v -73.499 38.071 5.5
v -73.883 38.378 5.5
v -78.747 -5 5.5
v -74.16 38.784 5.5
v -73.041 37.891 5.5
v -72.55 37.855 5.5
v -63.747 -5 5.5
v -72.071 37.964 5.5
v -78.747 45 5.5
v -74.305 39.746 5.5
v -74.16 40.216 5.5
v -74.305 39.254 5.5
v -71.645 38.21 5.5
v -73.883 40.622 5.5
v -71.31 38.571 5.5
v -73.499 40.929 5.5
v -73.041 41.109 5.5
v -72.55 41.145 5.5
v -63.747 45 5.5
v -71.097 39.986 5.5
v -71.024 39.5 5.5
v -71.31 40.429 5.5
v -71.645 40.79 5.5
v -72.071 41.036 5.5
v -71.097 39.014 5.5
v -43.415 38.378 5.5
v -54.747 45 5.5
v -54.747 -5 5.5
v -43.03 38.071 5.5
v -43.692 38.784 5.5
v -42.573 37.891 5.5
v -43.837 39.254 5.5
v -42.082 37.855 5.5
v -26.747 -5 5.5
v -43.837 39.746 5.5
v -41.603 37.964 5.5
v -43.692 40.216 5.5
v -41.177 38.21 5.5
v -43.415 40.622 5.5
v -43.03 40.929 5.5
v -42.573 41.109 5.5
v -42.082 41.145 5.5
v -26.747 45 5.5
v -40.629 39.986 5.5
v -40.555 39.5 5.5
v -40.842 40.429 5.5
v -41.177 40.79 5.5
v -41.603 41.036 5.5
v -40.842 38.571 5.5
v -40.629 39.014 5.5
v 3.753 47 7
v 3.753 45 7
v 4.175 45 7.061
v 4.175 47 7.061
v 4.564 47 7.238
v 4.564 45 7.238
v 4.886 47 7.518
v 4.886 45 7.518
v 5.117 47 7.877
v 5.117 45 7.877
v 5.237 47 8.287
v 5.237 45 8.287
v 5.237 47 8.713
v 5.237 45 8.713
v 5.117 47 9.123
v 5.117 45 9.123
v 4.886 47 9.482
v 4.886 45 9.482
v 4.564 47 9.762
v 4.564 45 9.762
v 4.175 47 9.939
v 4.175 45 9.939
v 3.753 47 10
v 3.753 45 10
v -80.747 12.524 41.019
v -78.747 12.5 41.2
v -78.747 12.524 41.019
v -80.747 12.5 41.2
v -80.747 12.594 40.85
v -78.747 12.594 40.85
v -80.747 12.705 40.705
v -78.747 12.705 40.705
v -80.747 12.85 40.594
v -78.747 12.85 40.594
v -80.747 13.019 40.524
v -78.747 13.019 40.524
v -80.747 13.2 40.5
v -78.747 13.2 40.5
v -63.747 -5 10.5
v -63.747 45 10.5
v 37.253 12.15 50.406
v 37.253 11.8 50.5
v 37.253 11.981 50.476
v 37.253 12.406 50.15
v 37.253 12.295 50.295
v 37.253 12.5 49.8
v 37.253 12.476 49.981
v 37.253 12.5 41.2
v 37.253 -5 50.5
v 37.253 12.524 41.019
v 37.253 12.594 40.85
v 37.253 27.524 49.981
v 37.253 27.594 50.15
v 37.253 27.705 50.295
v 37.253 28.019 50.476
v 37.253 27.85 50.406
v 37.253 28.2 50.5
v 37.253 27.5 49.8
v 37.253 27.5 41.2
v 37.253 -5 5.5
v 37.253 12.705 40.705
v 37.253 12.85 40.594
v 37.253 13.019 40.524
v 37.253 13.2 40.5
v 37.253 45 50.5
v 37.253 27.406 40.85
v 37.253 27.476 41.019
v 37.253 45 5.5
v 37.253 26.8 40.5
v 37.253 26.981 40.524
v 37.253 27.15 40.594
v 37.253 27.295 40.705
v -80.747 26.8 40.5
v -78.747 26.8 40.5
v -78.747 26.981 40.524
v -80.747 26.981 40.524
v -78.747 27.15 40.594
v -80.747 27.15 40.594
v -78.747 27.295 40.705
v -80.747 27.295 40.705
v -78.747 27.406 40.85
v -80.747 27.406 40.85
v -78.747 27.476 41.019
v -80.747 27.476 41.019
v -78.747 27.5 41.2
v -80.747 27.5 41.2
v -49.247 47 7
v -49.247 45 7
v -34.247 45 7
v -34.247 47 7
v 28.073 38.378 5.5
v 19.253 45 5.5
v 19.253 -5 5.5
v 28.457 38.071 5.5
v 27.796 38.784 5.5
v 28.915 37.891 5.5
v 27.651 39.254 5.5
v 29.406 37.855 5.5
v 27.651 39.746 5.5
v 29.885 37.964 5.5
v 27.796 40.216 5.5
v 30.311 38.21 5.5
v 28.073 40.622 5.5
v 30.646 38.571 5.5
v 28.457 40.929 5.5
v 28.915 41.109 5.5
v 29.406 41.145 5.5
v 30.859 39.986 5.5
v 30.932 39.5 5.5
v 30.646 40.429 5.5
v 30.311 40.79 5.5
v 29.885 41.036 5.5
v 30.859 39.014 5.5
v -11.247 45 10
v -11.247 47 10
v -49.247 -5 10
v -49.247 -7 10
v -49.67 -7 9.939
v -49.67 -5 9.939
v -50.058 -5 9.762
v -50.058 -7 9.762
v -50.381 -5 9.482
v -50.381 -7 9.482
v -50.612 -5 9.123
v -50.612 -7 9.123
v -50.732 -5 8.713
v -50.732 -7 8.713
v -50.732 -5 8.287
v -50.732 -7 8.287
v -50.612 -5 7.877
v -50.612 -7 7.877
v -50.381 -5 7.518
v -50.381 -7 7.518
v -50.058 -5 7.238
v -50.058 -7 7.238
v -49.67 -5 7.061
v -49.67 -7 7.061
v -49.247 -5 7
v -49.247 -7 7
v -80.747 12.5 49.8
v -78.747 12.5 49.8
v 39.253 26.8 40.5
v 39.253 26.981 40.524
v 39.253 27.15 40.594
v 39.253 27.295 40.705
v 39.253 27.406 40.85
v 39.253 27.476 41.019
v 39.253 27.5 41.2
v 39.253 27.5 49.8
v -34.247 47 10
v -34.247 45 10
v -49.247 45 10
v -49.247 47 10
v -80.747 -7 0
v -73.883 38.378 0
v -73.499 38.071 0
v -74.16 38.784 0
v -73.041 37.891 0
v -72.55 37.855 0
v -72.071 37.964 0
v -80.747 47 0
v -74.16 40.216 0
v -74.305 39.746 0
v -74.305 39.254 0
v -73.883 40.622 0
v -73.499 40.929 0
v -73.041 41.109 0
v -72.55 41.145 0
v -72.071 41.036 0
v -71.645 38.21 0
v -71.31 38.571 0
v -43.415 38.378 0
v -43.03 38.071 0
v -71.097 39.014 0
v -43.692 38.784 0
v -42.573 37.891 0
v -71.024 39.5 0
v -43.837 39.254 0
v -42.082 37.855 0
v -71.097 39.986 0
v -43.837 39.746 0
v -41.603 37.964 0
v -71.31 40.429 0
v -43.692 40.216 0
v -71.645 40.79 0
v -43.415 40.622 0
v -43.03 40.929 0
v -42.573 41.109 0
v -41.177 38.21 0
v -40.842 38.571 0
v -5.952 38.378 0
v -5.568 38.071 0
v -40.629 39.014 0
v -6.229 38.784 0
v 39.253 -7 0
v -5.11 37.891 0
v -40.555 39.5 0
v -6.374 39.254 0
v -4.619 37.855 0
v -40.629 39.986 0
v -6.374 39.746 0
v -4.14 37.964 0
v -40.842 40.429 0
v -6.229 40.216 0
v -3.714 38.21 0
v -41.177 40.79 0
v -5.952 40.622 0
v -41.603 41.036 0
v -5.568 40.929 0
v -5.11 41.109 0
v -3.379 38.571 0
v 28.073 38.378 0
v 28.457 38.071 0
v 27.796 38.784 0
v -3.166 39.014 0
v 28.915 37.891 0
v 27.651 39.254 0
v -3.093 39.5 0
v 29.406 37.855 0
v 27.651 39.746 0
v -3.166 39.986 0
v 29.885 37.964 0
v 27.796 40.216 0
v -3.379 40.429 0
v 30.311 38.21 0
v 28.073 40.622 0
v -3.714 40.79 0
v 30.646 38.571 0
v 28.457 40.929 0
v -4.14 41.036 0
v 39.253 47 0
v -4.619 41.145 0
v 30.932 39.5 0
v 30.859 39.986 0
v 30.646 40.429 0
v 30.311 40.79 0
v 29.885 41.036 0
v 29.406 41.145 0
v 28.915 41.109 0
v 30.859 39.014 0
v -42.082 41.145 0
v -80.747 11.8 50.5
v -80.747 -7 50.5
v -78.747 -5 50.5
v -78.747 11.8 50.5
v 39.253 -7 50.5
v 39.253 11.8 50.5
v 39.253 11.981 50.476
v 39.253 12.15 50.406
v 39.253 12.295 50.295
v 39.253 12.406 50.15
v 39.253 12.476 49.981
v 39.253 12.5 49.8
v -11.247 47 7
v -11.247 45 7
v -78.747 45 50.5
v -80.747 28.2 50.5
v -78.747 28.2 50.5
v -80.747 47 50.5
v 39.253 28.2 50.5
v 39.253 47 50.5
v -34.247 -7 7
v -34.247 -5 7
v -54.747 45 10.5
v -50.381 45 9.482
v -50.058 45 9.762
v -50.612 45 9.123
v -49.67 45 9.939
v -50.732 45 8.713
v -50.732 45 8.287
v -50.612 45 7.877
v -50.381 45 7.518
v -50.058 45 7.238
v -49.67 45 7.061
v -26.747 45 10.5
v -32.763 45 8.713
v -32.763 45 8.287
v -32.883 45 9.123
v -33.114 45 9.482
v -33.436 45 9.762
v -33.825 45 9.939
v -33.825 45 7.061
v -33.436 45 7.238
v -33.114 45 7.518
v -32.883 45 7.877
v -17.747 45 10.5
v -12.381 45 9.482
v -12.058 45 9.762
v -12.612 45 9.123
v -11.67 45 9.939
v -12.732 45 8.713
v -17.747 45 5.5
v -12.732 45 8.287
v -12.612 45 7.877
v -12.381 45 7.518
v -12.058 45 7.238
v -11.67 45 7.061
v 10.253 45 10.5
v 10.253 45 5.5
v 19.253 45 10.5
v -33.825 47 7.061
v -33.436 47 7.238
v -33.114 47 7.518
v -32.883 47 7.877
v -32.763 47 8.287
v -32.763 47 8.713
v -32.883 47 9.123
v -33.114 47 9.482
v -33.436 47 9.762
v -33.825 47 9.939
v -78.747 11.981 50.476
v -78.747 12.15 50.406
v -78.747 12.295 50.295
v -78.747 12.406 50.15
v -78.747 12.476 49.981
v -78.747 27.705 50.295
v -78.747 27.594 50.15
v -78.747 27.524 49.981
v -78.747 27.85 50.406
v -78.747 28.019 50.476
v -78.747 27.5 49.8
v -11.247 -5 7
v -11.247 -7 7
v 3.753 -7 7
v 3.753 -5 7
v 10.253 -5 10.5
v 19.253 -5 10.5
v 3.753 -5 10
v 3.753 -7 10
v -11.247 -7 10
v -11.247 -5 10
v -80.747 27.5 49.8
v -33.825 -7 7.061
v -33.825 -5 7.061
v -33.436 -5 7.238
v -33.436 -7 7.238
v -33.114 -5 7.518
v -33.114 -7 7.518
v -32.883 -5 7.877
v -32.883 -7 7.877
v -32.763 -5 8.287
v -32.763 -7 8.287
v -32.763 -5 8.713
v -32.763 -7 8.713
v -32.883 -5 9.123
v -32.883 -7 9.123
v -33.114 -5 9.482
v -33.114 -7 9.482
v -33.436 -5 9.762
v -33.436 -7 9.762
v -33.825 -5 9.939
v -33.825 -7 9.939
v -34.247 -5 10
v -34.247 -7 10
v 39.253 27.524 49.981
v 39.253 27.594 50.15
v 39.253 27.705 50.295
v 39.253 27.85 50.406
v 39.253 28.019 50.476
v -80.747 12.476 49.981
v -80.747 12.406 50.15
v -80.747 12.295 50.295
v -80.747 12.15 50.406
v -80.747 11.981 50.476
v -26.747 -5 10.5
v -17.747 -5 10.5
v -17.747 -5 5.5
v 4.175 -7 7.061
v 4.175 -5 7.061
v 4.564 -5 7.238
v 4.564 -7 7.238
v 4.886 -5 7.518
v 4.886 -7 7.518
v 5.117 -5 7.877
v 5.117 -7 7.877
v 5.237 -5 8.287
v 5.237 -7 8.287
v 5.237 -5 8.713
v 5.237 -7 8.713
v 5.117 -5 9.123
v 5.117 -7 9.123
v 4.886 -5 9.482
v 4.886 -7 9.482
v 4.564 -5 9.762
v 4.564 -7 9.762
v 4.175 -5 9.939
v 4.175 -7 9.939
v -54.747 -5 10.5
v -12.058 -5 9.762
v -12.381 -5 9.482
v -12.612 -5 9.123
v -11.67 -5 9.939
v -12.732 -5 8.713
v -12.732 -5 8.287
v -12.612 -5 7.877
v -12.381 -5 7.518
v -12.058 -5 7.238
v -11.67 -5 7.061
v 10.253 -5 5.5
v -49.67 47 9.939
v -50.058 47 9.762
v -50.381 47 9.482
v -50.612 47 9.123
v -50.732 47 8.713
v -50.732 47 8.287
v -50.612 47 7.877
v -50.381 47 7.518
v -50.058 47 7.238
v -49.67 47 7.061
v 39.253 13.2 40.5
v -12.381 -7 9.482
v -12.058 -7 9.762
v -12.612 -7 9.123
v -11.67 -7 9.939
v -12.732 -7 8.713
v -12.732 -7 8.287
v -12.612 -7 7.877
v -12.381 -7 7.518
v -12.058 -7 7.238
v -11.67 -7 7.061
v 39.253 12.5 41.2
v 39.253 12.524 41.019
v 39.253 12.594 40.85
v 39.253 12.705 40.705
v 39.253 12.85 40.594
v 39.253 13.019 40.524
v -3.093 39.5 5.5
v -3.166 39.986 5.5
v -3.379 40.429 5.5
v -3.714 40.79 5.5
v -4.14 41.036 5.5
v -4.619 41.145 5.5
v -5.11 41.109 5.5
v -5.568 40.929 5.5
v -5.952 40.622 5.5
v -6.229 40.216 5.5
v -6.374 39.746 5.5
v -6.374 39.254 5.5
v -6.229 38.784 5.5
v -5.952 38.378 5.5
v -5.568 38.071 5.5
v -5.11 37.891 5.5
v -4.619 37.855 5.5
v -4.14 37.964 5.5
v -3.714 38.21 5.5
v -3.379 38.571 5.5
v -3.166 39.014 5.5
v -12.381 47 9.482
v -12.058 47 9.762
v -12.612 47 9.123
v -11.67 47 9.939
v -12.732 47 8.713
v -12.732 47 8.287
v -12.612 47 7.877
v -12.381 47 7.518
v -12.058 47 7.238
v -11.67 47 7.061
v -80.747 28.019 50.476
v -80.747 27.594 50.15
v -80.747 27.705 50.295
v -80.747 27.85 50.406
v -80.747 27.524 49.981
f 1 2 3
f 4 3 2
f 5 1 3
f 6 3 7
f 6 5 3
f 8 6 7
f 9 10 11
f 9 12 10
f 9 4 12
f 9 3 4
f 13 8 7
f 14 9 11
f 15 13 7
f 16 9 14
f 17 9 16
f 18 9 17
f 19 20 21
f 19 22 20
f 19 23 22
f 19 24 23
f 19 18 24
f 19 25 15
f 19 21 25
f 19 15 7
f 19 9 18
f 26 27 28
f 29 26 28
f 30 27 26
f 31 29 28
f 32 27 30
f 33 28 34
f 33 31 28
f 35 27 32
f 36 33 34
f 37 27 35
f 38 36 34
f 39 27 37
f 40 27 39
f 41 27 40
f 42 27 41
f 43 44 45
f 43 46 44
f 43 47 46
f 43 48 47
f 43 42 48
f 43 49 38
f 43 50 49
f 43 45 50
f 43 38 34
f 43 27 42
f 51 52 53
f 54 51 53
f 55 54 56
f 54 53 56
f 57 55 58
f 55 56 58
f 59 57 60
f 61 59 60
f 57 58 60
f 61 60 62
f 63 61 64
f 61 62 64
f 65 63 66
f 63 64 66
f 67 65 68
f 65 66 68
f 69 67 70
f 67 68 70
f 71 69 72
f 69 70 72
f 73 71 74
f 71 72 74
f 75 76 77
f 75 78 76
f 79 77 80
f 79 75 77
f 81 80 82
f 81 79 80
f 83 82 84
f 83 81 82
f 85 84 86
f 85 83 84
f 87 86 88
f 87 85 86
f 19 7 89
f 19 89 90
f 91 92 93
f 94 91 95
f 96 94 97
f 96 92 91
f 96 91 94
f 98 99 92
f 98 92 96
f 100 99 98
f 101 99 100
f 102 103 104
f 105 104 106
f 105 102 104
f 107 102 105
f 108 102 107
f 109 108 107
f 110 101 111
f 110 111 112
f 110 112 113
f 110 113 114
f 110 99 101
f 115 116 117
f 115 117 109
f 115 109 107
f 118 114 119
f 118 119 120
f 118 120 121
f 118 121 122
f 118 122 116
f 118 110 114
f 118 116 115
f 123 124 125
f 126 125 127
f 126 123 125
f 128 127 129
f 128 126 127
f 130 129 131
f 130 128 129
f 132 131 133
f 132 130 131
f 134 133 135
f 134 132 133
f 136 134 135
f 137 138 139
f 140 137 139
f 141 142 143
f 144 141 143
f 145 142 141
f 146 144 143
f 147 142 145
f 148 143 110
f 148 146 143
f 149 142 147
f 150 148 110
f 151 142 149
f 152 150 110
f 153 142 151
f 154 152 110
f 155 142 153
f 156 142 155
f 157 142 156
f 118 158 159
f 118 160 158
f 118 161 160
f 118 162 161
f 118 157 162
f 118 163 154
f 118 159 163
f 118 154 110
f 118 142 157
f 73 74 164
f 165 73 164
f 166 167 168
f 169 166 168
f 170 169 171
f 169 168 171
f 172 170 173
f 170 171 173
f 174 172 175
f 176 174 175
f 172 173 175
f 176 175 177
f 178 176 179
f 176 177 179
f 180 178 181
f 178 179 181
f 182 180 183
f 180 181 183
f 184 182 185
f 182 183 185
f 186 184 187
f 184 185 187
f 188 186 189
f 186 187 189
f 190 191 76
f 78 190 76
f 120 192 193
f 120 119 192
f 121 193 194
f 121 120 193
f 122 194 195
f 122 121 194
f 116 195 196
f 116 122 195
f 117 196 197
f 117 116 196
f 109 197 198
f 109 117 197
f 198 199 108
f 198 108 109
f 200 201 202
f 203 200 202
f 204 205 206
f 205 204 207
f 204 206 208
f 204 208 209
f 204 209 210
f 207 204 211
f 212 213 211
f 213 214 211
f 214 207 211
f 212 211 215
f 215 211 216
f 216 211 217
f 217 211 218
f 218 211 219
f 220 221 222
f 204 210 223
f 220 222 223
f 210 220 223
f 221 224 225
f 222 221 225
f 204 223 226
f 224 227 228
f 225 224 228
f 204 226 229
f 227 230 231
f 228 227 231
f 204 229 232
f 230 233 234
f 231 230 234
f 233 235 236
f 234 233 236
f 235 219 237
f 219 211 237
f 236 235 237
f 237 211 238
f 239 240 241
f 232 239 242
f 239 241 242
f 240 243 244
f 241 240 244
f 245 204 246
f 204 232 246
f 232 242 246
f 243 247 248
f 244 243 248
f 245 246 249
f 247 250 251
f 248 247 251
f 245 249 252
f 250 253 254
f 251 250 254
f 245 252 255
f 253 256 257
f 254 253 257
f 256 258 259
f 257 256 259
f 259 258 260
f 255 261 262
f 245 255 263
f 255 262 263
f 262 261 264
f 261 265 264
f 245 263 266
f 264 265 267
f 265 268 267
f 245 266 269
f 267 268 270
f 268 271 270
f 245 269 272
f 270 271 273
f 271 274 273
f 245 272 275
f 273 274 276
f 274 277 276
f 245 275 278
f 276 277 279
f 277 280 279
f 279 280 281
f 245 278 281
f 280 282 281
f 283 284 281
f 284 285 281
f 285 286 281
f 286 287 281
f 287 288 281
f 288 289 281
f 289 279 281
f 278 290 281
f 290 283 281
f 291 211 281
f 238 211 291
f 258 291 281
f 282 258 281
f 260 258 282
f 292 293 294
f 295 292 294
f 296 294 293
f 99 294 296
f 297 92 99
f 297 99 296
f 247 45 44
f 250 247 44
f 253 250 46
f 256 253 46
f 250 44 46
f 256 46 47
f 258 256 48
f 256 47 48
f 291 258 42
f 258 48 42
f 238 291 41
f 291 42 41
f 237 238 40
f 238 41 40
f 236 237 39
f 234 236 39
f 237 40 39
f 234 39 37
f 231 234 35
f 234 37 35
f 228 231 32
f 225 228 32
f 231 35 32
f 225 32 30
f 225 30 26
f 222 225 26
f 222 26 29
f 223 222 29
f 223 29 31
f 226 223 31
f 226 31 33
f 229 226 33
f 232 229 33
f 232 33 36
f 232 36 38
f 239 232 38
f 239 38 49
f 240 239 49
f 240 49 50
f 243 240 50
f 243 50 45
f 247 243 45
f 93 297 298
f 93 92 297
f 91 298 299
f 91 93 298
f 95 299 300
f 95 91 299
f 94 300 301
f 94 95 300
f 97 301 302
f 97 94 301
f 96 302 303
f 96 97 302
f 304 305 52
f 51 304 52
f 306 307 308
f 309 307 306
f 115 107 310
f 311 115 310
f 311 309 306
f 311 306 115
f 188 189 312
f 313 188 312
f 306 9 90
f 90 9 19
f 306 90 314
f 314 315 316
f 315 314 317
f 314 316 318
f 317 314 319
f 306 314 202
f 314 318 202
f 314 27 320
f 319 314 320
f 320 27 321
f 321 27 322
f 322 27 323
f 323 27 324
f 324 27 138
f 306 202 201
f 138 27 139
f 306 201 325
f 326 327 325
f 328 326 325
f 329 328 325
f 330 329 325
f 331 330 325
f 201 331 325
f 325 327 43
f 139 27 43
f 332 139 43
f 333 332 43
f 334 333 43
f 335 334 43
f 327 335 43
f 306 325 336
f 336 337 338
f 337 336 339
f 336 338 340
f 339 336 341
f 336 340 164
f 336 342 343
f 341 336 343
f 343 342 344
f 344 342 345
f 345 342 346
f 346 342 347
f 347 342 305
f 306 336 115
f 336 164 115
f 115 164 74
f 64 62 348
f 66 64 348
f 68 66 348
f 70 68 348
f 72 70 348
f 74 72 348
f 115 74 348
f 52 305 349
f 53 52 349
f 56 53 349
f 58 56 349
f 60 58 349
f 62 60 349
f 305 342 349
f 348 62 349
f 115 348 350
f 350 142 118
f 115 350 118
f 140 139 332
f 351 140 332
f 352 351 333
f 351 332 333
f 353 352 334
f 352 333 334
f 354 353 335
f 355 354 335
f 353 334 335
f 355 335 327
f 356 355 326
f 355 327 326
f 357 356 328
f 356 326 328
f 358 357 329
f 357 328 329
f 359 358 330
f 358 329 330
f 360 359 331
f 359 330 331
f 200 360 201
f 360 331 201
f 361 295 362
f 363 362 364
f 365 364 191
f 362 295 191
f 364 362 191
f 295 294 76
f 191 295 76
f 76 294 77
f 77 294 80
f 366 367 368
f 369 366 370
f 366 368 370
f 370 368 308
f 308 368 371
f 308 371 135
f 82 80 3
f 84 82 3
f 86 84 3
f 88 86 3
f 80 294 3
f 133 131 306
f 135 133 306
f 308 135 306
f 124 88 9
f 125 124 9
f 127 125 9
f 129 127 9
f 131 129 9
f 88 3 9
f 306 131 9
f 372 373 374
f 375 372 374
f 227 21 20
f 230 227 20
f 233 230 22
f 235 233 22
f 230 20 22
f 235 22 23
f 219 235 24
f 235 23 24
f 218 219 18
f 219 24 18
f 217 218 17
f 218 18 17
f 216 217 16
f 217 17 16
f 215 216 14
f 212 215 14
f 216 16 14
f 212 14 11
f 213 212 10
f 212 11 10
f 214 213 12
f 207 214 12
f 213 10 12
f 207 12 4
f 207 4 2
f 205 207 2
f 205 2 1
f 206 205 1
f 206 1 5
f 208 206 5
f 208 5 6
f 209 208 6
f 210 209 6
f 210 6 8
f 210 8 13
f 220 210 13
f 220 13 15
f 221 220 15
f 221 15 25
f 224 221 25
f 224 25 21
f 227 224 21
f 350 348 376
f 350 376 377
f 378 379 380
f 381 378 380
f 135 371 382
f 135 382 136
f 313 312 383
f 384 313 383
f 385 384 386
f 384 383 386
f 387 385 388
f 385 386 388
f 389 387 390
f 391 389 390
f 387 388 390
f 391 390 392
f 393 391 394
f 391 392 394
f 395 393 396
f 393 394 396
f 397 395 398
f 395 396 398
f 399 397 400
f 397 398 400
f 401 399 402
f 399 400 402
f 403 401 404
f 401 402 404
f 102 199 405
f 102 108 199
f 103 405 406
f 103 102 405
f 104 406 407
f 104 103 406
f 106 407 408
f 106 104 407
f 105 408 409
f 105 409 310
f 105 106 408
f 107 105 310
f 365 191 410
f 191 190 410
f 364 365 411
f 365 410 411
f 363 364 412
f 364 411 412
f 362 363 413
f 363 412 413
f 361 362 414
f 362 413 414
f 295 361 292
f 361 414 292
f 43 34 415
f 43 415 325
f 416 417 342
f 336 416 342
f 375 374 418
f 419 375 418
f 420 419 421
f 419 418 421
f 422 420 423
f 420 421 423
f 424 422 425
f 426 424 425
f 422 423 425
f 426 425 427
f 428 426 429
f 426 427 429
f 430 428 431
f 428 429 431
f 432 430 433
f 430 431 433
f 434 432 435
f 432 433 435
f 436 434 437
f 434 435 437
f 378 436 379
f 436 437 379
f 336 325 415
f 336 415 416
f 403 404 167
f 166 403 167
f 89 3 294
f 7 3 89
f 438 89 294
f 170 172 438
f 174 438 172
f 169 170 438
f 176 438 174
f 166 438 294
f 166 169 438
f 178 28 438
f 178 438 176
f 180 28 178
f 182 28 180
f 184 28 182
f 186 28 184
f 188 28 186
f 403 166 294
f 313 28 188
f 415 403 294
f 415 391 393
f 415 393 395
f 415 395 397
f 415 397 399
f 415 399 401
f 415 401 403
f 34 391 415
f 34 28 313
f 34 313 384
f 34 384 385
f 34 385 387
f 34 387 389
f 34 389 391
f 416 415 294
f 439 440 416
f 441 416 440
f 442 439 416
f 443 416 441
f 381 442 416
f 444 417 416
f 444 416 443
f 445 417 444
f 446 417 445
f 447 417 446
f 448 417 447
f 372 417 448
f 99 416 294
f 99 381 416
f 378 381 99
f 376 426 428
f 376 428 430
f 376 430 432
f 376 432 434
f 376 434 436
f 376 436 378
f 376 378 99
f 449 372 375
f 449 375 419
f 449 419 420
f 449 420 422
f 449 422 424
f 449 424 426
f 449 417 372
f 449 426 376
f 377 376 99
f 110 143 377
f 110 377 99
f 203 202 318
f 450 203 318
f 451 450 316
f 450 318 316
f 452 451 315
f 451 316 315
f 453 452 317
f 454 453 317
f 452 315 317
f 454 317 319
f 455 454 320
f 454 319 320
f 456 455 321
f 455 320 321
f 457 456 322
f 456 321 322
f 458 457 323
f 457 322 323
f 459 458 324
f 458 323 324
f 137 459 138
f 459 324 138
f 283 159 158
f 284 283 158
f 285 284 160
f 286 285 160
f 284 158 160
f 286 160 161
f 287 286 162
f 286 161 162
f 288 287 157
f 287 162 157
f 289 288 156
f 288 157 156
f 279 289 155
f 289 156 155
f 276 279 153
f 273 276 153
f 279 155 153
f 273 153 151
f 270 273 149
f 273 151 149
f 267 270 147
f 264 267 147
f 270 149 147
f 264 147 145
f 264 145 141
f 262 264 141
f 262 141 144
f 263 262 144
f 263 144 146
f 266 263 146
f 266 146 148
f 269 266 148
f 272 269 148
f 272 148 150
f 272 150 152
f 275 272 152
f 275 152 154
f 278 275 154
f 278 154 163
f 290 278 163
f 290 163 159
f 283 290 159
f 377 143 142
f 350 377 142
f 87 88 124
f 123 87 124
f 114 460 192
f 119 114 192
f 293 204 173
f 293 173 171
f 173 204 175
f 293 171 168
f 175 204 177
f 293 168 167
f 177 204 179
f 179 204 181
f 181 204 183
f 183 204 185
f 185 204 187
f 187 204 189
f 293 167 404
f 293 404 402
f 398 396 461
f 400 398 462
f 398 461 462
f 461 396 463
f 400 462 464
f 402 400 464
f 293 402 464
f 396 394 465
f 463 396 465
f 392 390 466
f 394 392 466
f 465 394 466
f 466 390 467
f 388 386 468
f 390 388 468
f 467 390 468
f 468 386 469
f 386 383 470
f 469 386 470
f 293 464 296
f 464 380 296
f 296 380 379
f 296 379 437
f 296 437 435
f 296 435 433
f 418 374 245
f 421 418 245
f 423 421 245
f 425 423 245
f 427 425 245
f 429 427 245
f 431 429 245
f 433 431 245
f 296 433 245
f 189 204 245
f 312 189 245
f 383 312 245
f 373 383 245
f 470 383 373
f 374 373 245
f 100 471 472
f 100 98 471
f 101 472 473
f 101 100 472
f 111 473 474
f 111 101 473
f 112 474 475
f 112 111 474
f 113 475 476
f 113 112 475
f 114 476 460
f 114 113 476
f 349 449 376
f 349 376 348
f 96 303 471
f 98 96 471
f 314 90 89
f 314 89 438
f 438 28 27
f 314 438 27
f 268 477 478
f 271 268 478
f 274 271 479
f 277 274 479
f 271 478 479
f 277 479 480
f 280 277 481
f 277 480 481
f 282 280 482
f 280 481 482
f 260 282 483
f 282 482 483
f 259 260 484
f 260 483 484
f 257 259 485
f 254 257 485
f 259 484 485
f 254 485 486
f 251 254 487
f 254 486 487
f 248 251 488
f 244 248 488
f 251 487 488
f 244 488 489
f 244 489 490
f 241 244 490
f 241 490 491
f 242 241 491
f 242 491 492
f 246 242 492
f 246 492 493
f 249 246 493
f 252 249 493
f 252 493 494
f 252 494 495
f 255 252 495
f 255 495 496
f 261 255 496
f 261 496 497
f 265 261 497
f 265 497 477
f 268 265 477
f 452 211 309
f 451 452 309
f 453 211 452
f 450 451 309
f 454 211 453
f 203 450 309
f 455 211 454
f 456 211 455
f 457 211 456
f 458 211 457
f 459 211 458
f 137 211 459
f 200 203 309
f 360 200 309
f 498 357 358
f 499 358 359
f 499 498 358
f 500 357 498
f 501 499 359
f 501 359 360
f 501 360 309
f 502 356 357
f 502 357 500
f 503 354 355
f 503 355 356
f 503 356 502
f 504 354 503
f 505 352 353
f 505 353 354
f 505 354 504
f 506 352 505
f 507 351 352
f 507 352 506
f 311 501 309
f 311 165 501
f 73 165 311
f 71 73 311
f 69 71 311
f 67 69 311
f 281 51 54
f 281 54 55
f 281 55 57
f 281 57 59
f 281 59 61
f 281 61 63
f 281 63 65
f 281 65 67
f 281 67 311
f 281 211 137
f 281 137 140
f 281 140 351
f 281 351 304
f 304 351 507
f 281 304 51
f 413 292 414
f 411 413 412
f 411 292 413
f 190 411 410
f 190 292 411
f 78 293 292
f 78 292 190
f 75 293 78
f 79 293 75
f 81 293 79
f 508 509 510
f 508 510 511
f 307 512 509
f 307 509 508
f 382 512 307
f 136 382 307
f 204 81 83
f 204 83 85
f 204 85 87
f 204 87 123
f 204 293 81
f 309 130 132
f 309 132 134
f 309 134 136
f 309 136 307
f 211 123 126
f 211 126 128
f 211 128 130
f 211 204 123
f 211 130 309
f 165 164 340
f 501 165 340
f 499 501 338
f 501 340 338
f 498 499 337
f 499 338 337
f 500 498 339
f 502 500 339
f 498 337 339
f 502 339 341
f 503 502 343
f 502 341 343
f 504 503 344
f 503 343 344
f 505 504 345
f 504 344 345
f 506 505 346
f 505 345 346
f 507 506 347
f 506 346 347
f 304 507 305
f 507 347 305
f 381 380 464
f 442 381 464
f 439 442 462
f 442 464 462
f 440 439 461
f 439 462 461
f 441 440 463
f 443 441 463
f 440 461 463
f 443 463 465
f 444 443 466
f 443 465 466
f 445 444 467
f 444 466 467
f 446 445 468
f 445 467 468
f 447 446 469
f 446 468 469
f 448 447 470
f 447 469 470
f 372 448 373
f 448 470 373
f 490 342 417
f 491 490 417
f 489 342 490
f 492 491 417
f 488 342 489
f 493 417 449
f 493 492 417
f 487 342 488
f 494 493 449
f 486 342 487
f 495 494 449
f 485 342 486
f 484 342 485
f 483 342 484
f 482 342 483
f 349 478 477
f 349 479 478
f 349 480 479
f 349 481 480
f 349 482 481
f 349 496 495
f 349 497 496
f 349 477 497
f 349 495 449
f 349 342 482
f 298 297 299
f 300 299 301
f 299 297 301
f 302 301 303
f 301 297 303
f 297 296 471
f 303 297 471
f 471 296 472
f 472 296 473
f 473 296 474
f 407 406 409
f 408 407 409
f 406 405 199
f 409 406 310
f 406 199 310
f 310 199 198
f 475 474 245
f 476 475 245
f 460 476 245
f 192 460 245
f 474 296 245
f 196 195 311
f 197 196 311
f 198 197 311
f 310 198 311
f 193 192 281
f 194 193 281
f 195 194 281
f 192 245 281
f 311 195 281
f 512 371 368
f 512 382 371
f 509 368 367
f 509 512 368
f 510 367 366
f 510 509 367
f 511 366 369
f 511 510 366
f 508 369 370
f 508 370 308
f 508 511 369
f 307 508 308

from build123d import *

# Parameters (mm, degrees)
SKETCH1_W               = 120
SKETCH1_H               = 54
BOSS_EXTRUDE1_DEPTH     = 5.5
SKETCH2_W               = 120
SKETCH2_H               = 54
SKETCH2_W_2             = 116
SKETCH2_H_2             = 50
BOSS_EXTRUDE2_DEPTH     = 45
SKETCH3_W               = 9
SKETCH3_H               = 50
BOSS_EXTRUDE3_DEPTH     = 5
SKETCH4_R               = 1.65
CUT_EXTRUDE5_DEPTH      = 14
SKETCH5_W               = 10
SKETCH5_H               = 15
CUT_EXTRUDE7_DEPTH      = 139.416942605
FILLET1_R               = 0.7
FILLET2_R               = 0.7
FILLET3_R               = 0.7
FILLET4_R               = 0.7
FILLET5_R               = 0.7
FILLET6_R               = 0.7
FILLET7_R               = 0.7
FILLET8_R               = 0.7
CUT_EXTRUDE8_DEPTH      = 109.509763737
CUT_EXTRUDE8_DEPTH_BACK = 109.509763737


with BuildPart() as part:
    # Sketch1 → Boss-Extrude1 (new body)
    with BuildSketch(Plane.XY):
        with Locations((-20.747252747, 20)):
            Rectangle(SKETCH1_W, SKETCH1_H)
    extrude(amount=BOSS_EXTRUDE1_DEPTH)

    # Sketch2 → Boss-Extrude2 (add)
    with BuildSketch(Plane.XY.offset(5.5)):
        with Locations((-20.747252747, 20)):
            Rectangle(SKETCH2_W, SKETCH2_H)
        with Locations((-20.747252747, 20)):
            Rectangle(SKETCH2_W_2, SKETCH2_H_2, mode=Mode.SUBTRACT)
    extrude(amount=BOSS_EXTRUDE2_DEPTH)

    # Sketch3 → Boss-Extrude3 (add)
    with BuildSketch(Plane.XY.offset(5.5)):
        with Locations((-59.247252747, 20)):
            Rectangle(SKETCH3_W, SKETCH3_H)
        with Locations((-22.247252747, 20)):
            Rectangle(SKETCH3_W, SKETCH3_H)
        with Locations((14.752747253, 20)):
            Rectangle(SKETCH3_W, SKETCH3_H)
    extrude(amount=BOSS_EXTRUDE3_DEPTH)

    # Sketch4 → Cut-Extrude5 (cut)
    with BuildSketch(Plane.XY.offset(5.5)):
        with Locations((-4.74254548, 39.5)):
            Circle(SKETCH4_R)
        with Locations((-42.205415824, 39.5)):
            Circle(SKETCH4_R)
        with Locations((-72.673636324, 39.5)):
            Circle(SKETCH4_R)
        with Locations((29.282276635, 39.5)):
            Circle(SKETCH4_R)
    extrude(amount=-CUT_EXTRUDE5_DEPTH, mode=Mode.SUBTRACT)

    # Sketch5 → Cut-Extrude7 (cut, through all)
    with BuildSketch(Plane(origin=(39.252747253, 0, 0), x_dir=(0, 0, -1), z_dir=(1, 0, 0))):
        with Locations((-45.5, 20)):
            Rectangle(SKETCH5_W, SKETCH5_H)
    extrude(amount=-CUT_EXTRUDE7_DEPTH, mode=Mode.SUBTRACT)

    # Fillet1
    fillet1_edges = [part.edges().sort_by_distance(p)[0] for p in [
        (38.252747253, 12.5, 40.5),
    ]]
    fillet(fillet1_edges, radius=FILLET1_R)

    # Fillet2
    fillet2_edges = [part.edges().sort_by_distance(p)[0] for p in [
        (38.252747253, 27.5, 40.5),
    ]]
    fillet(fillet2_edges, radius=FILLET2_R)

    # Fillet3
    fillet3_edges = [part.edges().sort_by_distance(p)[0] for p in [
        (-79.747252747, 12.5, 40.5),
    ]]
    fillet(fillet3_edges, radius=FILLET3_R)

    # Fillet4
    fillet4_edges = [part.edges().sort_by_distance(p)[0] for p in [
        (-79.747252747, 27.5, 40.5),
    ]]
    fillet(fillet4_edges, radius=FILLET4_R)

    # Fillet5
    fillet5_edges = [part.edges().sort_by_distance(p)[0] for p in [
        (-79.747252747, 12.5, 50.5),
    ]]
    fillet(fillet5_edges, radius=FILLET5_R)

    # Fillet6
    fillet6_edges = [part.edges().sort_by_distance(p)[0] for p in [
        (-79.747252747, 27.5, 50.5),
    ]]
    fillet(fillet6_edges, radius=FILLET6_R)

    # Fillet7
    fillet7_edges = [part.edges().sort_by_distance(p)[0] for p in [
        (38.252747253, 12.5, 50.5),
    ]]
    fillet(fillet7_edges, radius=FILLET7_R)

    # Fillet8
    fillet8_edges = [part.edges().sort_by_distance(p)[0] for p in [
        (38.252747253, 27.5, 50.5),
    ]]
    fillet(fillet8_edges, radius=FILLET8_R)

    # Sketch6 → Cut-Extrude8 (cut, two sides: drawn at the far end of the back side and taken through both)
    with BuildSketch(Plane(origin=(0, -5, 0), x_dir=(1, 0, 0), z_dir=(0, 1, 0)).offset(-CUT_EXTRUDE8_DEPTH_BACK)):
        with BuildLine():
            Line((-49.247252747, -7), (-34.247252747, -7))
            ThreePointArc((-34.247252747, -7), (-32.747252747, -8.5), (-34.247252747, -10))
            Line((-34.247252747, -10), (-49.247252747, -10))
            ThreePointArc((-49.247252747, -10), (-50.747252747, -8.5), (-49.247252747, -7))
        make_face()
        with BuildLine():
            Line((-11.247252747, -7), (3.752747253, -7))
            ThreePointArc((3.752747253, -7), (5.252747253, -8.5), (3.752747253, -10))
            Line((3.752747253, -10), (-11.247252747, -10))
            ThreePointArc((-11.247252747, -10), (-12.747252747, -8.5), (-11.247252747, -7))
        make_face()
    extrude(amount=CUT_EXTRUDE8_DEPTH + CUT_EXTRUDE8_DEPTH_BACK, mode=Mode.SUBTRACT)


solid = part.part
